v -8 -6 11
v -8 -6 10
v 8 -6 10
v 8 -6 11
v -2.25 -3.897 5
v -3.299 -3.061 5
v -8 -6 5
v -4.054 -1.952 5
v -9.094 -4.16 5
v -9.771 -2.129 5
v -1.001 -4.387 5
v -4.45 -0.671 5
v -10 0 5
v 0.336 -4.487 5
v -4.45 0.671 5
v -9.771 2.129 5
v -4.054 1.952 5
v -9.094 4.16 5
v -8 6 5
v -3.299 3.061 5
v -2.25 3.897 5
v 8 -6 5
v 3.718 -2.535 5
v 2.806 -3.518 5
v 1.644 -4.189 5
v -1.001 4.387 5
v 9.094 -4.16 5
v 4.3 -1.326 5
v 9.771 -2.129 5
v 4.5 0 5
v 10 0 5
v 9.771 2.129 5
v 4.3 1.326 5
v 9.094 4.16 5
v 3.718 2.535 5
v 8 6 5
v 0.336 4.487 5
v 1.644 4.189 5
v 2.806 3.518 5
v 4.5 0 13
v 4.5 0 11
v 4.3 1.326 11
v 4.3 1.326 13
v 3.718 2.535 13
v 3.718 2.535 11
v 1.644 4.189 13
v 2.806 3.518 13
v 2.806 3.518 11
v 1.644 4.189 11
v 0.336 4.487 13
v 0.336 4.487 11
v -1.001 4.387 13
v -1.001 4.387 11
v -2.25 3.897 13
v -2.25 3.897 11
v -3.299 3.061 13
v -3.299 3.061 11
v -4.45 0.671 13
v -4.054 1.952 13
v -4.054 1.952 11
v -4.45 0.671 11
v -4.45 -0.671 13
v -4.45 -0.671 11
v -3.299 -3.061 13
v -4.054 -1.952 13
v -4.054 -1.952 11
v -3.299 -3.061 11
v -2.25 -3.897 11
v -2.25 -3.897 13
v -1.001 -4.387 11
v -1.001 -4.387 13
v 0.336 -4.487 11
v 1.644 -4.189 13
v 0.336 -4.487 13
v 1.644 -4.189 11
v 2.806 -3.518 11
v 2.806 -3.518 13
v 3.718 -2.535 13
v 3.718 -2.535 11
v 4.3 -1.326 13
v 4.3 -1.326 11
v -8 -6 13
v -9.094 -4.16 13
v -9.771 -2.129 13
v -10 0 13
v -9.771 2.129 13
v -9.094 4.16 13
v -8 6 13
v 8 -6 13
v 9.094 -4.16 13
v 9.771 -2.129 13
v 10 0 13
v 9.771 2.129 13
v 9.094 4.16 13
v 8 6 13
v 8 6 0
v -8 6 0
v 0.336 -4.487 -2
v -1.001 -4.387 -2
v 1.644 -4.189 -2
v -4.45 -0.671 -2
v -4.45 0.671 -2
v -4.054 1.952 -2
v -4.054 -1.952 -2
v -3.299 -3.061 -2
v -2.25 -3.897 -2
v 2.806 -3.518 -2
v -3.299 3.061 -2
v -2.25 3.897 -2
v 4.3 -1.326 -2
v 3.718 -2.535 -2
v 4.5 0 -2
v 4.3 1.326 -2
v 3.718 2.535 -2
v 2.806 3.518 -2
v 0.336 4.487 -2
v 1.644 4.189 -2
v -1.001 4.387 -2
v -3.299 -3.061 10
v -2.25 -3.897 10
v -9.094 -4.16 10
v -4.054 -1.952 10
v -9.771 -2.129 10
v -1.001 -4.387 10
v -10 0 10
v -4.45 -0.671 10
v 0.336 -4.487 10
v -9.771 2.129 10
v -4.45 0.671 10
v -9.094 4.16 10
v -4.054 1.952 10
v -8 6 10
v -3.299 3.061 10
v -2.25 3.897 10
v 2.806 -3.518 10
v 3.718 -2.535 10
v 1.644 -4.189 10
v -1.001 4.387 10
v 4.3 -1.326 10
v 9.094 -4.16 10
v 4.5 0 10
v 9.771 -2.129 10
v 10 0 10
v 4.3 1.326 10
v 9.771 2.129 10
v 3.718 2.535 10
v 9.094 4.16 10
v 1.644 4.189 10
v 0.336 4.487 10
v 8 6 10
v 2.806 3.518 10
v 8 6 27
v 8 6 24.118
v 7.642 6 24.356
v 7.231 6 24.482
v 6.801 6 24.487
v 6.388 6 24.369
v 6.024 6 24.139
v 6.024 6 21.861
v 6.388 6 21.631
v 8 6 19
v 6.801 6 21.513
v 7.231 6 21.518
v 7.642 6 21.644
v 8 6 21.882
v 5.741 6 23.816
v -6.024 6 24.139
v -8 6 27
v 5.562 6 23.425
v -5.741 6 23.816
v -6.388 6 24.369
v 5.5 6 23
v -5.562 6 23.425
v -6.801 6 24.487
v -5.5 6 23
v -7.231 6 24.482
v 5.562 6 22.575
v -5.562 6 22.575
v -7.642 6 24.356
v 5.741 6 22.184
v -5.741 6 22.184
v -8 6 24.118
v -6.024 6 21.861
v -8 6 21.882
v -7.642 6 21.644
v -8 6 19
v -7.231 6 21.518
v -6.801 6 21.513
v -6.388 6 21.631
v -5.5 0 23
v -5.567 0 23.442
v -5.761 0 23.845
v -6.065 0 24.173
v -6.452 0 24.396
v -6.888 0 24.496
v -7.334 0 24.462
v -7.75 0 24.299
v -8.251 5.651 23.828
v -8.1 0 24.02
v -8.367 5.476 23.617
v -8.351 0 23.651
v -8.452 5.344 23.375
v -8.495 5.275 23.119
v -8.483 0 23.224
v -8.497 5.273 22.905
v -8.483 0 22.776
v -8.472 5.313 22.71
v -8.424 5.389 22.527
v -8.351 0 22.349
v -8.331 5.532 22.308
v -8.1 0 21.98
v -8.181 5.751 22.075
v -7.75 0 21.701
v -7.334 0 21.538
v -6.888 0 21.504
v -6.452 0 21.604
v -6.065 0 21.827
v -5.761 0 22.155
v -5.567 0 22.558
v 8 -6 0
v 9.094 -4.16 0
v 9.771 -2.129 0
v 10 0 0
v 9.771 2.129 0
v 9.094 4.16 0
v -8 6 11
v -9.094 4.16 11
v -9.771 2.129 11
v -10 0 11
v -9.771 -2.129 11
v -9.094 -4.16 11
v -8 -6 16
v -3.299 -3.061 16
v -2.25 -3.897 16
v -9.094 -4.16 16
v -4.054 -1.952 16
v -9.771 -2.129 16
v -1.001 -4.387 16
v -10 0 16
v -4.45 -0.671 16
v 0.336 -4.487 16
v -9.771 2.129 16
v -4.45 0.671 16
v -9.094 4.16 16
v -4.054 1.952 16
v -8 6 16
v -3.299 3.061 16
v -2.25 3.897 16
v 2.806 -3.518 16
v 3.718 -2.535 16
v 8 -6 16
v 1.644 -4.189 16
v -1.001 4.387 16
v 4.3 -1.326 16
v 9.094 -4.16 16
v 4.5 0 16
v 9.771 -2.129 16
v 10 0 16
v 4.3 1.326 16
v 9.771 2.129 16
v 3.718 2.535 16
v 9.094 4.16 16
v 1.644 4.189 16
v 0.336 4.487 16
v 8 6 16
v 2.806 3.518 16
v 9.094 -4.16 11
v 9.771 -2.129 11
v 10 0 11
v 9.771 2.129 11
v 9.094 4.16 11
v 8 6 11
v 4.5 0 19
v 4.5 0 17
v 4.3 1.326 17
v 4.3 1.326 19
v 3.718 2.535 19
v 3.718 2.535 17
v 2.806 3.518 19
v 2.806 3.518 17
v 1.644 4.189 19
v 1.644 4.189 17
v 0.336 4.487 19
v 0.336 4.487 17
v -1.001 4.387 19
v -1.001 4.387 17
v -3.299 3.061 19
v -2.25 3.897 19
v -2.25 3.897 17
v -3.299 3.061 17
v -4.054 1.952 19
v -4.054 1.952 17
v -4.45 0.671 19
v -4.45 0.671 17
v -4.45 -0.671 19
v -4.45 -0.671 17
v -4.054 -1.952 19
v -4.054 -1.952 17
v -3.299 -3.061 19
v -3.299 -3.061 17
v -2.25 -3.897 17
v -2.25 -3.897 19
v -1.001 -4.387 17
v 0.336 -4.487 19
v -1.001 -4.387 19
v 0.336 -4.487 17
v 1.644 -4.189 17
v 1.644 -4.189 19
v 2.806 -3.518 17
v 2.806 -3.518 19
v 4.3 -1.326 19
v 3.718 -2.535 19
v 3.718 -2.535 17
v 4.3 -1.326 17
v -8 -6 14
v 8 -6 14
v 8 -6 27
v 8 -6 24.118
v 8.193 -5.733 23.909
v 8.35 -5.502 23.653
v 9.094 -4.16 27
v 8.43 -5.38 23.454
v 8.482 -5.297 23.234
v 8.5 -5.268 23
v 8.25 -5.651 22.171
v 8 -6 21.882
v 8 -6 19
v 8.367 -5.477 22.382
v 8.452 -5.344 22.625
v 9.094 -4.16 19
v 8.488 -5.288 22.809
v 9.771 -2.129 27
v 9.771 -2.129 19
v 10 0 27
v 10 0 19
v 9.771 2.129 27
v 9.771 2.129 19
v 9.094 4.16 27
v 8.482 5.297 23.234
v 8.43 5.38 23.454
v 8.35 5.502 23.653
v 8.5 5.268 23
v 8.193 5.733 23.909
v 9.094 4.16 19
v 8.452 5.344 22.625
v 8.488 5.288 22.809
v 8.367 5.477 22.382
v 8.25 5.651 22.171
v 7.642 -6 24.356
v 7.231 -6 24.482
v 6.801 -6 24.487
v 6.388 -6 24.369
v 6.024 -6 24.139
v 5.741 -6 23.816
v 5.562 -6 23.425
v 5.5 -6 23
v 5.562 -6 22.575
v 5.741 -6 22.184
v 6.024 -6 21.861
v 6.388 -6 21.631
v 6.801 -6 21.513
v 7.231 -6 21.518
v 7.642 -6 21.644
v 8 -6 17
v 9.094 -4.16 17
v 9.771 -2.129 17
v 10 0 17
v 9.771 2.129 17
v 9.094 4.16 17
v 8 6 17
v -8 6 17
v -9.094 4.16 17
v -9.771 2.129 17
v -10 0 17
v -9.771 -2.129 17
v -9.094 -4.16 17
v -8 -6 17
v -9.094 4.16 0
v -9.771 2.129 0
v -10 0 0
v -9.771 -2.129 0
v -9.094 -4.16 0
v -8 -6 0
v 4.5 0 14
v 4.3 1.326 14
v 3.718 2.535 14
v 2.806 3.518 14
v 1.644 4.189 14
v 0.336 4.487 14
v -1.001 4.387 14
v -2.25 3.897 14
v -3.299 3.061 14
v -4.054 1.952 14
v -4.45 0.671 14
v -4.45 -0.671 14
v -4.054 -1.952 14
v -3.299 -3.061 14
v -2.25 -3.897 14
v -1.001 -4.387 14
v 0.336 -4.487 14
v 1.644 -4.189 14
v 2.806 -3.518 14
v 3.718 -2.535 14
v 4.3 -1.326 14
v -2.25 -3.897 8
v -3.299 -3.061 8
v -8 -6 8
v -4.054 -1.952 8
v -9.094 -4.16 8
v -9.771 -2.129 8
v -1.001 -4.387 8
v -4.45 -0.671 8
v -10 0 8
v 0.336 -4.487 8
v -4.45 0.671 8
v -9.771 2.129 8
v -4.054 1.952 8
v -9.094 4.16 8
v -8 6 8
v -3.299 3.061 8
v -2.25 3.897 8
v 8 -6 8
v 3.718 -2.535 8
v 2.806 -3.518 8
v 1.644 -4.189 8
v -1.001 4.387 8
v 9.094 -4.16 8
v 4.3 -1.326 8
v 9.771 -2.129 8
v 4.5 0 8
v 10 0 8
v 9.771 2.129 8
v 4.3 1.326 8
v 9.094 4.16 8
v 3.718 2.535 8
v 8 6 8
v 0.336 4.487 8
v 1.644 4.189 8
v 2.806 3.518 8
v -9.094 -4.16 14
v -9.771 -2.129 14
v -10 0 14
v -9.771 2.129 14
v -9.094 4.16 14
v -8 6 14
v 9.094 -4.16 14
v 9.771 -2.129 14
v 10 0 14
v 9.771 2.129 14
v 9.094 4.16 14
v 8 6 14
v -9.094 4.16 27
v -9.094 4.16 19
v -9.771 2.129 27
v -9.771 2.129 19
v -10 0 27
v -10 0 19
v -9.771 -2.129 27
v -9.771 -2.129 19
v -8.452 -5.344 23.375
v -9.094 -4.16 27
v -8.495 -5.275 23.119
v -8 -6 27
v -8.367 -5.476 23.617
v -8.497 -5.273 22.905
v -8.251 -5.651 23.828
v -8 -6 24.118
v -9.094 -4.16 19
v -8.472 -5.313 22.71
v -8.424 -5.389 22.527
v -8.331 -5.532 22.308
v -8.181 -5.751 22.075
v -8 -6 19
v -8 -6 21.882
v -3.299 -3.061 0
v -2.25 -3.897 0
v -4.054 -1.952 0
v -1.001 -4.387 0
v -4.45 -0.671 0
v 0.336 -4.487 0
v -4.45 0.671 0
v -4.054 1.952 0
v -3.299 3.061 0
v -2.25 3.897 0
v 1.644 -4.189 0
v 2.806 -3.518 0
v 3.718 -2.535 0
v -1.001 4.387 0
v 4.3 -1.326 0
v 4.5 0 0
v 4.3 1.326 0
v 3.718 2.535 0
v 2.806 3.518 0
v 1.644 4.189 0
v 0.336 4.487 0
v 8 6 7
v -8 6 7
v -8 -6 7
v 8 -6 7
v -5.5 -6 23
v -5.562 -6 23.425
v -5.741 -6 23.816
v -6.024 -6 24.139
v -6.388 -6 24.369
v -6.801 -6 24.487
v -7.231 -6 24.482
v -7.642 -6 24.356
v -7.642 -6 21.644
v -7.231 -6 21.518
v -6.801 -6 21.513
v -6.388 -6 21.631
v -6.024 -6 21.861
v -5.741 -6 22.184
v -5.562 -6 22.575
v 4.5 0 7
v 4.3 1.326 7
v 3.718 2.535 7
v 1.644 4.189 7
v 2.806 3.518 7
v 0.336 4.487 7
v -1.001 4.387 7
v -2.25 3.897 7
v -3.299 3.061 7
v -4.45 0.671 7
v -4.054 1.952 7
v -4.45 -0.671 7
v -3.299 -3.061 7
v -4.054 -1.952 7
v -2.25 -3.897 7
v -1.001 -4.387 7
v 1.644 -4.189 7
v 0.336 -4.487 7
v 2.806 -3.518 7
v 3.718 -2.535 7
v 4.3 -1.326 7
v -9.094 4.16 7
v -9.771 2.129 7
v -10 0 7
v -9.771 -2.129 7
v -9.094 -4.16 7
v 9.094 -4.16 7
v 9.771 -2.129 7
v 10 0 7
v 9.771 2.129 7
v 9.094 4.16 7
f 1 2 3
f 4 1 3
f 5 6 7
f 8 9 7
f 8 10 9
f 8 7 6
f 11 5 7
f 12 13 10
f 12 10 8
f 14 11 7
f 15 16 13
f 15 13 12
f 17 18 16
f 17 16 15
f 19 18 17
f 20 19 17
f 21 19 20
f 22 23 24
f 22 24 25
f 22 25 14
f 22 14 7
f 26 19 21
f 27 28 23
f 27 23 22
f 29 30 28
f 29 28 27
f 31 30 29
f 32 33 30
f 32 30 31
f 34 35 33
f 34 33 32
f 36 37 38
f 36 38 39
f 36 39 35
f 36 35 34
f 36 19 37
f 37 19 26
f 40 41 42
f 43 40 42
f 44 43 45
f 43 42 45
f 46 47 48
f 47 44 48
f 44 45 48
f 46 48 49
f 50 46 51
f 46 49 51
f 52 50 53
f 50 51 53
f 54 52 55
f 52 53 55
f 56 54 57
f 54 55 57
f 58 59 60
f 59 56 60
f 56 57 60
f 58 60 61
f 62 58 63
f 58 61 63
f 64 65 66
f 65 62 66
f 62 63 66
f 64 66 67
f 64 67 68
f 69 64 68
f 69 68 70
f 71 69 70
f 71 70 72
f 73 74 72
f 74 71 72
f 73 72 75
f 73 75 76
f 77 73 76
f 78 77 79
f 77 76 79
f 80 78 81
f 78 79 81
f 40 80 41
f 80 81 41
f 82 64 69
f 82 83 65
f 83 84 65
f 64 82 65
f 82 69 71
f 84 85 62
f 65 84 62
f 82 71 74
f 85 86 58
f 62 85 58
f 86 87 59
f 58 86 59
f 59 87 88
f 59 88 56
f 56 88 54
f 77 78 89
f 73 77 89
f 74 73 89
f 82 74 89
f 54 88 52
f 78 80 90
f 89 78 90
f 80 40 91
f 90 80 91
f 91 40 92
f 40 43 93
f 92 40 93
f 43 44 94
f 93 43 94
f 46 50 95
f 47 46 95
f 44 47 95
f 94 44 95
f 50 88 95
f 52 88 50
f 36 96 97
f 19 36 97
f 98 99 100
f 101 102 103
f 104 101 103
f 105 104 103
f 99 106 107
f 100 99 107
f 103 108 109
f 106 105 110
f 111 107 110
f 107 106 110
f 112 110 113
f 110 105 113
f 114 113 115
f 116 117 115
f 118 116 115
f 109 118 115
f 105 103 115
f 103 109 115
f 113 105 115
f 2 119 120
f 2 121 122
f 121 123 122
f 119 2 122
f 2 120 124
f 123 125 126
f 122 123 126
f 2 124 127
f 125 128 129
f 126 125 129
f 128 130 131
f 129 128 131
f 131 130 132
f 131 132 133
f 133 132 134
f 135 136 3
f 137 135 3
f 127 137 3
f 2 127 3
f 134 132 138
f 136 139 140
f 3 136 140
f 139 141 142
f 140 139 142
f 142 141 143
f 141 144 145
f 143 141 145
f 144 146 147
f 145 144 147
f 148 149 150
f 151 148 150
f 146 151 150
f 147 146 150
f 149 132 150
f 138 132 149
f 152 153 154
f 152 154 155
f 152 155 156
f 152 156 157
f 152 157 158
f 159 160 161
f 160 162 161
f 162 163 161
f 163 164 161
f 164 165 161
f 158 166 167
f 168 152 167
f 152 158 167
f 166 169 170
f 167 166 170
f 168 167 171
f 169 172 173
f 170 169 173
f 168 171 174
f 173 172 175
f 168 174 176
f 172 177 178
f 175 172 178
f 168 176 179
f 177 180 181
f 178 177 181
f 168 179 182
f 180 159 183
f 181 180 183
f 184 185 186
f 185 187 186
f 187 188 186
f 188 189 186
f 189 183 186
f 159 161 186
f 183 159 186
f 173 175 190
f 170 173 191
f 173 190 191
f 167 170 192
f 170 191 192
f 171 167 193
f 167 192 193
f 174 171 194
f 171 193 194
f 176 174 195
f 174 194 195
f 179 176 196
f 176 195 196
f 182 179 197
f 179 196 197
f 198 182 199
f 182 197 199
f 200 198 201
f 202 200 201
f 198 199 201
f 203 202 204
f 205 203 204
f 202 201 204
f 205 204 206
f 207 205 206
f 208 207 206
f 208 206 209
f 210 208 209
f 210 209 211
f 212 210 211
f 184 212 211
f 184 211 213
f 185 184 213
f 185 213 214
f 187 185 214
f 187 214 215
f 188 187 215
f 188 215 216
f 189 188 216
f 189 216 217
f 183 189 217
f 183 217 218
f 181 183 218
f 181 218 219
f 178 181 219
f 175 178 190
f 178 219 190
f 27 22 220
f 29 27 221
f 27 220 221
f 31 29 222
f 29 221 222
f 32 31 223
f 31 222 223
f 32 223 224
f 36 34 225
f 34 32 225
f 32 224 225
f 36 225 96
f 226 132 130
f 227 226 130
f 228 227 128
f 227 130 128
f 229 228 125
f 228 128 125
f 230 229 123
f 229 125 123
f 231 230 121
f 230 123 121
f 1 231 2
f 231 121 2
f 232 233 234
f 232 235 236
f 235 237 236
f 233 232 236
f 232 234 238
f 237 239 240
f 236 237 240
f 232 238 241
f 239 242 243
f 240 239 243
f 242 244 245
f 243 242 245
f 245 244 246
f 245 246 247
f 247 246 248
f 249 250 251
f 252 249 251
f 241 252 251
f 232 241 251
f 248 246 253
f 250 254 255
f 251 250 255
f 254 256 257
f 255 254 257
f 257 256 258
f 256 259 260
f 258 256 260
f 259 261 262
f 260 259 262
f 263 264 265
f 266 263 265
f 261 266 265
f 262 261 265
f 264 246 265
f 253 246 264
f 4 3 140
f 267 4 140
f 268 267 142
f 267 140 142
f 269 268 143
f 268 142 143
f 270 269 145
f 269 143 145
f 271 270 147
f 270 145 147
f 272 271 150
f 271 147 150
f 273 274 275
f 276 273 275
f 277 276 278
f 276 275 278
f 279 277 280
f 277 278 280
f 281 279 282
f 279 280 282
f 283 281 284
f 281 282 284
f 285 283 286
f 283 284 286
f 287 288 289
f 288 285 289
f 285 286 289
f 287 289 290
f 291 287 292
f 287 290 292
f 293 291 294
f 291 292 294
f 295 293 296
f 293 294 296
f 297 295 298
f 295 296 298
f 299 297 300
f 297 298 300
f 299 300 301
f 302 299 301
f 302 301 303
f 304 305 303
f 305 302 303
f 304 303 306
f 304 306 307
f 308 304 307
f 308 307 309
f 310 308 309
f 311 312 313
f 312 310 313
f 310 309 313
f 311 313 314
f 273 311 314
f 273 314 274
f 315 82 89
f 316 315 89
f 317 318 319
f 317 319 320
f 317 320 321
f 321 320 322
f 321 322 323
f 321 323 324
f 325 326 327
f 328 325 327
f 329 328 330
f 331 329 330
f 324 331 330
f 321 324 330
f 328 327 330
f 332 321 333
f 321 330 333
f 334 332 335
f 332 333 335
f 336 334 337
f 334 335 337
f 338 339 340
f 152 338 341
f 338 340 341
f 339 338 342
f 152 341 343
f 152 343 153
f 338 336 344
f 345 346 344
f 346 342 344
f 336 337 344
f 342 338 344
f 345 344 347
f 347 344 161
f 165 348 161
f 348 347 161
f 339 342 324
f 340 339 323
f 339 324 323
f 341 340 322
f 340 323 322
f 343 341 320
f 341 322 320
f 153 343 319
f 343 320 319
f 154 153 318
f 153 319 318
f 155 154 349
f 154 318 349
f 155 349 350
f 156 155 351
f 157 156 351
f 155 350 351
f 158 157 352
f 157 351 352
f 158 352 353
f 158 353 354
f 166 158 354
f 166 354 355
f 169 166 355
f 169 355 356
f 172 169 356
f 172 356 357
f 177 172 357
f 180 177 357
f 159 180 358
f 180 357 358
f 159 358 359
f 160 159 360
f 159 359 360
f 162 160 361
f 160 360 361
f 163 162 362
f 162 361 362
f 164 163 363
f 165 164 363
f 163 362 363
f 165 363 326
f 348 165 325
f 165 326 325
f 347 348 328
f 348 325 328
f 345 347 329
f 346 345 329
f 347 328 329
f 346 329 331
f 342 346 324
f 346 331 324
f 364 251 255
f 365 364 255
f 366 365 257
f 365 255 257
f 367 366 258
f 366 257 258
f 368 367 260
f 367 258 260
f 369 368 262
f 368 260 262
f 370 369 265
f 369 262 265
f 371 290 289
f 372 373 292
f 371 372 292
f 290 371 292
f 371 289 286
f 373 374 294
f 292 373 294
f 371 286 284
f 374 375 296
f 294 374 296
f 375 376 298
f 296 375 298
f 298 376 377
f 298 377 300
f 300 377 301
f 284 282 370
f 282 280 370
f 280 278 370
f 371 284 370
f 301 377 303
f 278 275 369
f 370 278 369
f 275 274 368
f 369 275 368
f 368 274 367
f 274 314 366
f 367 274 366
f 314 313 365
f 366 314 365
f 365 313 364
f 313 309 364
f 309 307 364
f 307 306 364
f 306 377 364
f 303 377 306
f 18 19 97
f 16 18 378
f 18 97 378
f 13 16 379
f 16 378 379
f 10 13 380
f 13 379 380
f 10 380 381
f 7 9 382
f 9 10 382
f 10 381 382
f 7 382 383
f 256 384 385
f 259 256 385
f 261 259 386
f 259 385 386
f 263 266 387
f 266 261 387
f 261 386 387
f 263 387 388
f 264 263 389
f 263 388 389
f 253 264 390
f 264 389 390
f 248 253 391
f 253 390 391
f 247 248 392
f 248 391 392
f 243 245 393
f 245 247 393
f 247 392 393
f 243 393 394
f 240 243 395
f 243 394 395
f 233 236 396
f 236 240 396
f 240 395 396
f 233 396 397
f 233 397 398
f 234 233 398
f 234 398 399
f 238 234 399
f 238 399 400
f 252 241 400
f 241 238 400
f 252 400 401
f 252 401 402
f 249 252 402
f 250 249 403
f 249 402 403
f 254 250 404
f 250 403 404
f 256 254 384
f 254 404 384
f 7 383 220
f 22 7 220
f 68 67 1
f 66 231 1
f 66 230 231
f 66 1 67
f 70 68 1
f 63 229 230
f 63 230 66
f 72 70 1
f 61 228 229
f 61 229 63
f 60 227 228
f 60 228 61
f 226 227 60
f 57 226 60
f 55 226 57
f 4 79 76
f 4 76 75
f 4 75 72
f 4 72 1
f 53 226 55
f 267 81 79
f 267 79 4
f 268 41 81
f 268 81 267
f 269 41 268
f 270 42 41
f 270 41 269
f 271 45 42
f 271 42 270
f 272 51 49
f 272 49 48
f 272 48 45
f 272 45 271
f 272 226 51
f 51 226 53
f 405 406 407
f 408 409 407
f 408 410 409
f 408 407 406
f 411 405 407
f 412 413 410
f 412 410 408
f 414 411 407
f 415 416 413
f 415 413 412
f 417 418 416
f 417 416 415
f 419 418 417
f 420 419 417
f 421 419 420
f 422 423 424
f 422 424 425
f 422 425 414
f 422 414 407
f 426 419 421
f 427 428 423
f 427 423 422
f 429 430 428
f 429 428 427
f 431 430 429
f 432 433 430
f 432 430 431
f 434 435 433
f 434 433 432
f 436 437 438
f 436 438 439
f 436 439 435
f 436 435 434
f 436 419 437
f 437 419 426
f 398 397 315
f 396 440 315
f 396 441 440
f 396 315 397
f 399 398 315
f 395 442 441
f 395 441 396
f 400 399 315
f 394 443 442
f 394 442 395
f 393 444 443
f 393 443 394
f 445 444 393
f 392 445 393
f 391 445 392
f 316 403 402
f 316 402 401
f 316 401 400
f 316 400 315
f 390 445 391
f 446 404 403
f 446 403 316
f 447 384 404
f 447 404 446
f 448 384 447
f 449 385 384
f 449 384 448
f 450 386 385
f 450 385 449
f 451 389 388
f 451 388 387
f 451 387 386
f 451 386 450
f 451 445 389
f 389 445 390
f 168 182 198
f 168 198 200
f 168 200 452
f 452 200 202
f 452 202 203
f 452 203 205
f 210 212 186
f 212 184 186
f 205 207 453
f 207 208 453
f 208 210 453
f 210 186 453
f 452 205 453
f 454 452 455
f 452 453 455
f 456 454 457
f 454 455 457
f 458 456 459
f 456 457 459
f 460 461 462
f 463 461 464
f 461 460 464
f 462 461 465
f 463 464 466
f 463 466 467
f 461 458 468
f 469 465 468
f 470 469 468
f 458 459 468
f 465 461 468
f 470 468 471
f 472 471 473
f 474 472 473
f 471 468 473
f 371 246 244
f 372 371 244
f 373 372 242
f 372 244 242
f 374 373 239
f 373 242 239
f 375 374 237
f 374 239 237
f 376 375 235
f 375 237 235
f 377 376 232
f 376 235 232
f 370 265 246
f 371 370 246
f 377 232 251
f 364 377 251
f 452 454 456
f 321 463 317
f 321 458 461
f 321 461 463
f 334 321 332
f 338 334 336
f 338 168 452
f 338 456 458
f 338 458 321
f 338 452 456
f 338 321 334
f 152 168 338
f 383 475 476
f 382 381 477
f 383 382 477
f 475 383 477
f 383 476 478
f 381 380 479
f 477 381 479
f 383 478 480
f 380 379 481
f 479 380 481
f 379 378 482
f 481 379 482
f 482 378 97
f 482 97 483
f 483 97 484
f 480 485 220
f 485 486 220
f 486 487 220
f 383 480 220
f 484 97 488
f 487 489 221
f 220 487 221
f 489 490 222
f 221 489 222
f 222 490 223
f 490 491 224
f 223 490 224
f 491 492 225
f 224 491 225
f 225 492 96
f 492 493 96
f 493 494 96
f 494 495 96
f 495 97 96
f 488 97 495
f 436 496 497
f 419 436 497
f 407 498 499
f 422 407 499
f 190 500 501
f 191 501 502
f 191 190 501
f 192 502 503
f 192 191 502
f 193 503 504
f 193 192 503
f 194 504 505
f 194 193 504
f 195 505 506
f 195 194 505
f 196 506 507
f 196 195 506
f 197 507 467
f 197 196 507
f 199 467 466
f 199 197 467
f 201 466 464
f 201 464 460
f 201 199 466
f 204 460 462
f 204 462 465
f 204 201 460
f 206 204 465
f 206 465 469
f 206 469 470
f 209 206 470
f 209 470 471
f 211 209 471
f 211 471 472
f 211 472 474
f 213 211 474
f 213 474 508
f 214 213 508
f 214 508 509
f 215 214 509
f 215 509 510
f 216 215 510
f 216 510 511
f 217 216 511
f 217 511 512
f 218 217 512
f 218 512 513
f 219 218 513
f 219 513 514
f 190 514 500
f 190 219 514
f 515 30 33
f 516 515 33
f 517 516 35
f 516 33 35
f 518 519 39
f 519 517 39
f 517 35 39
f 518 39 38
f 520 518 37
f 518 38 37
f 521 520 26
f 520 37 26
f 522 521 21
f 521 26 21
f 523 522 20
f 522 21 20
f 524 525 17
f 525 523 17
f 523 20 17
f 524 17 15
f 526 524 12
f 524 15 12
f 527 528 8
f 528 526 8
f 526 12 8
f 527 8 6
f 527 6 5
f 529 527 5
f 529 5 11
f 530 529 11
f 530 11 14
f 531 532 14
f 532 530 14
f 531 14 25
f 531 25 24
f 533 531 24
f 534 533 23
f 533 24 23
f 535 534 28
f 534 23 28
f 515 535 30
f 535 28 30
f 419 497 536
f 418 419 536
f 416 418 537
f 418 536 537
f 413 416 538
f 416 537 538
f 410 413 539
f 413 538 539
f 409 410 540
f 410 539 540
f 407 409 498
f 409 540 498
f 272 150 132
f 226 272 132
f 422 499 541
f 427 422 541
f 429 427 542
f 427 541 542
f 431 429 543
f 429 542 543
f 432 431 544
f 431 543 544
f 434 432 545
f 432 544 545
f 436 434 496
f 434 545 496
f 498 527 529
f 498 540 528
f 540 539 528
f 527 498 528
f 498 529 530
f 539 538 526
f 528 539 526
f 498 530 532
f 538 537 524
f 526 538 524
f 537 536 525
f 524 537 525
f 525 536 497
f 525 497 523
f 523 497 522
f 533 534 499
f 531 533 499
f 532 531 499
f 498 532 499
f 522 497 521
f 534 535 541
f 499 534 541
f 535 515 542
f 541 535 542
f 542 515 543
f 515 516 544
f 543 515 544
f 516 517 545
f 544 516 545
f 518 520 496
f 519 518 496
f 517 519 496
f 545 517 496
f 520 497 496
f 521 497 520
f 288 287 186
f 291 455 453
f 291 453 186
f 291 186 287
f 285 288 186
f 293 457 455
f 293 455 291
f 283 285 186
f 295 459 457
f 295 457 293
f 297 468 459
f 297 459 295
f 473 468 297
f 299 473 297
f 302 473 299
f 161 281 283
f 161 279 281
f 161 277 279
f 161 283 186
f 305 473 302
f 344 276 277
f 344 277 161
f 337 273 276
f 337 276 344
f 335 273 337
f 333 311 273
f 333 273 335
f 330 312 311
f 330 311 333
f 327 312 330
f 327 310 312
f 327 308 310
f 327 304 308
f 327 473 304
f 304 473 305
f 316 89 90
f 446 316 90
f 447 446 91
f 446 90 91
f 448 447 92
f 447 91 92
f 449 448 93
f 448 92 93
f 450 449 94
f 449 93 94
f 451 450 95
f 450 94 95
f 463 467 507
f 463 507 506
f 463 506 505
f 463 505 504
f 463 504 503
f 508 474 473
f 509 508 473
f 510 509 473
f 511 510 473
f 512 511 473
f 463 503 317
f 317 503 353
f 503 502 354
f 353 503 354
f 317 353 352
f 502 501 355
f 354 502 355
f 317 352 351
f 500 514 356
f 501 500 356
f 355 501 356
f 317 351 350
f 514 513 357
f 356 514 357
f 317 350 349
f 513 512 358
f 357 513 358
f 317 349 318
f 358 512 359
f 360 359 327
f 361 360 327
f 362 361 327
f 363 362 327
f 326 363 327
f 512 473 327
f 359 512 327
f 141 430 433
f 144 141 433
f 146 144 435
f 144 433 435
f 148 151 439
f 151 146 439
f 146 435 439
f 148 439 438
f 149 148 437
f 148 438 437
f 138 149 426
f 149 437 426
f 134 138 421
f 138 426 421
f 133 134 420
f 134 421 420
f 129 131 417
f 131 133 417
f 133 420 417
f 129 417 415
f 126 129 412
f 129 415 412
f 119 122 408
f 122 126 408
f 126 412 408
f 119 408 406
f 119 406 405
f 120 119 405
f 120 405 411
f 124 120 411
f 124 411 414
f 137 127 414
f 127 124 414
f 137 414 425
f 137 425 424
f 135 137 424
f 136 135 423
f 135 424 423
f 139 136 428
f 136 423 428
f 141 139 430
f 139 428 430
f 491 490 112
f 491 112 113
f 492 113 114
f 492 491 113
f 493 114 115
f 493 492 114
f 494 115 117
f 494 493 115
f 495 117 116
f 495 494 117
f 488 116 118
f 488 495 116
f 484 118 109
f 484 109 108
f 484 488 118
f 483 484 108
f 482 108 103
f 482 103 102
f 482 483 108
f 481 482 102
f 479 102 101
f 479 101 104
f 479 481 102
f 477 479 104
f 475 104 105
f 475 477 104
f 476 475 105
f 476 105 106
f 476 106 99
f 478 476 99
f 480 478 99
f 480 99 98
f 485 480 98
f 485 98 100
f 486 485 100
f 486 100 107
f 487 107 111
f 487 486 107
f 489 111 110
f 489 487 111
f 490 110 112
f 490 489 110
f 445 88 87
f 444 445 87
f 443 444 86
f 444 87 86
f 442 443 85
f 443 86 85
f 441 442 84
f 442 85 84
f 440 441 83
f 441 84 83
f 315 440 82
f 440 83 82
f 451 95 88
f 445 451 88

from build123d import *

# Parameters (mm, degrees)
F1_DEPTH      = 27
F2_W          = 30
F2_H          = 2
F3_DEPTH      = 6
F4_R          = 4.5
F5_DEPTH      = 27
F5_DEPTH_BACK = 2
F6_R          = 1.5
F7_DEPTH      = 6


with BuildPart() as f1:
    # F0 (on Top) → F1 (new body)
    with BuildSketch(Plane.XY):
        with BuildLine():
            Line((-8, -6), (8, -6))
            ThreePointArc((8, -6), (10, 0), (8, 6))
            Line((8, 6), (-8, 6))
            ThreePointArc((-8, 6), (-10, 0), (-8, -6))
        make_face()
    extrude(amount=F1_DEPTH)

    # F2 (on Front) → F3 (cut, symmetric)
    with BuildSketch(Plane.XZ):
        with Locations((0, 6)):
            Rectangle(F2_W, F2_H)
        with Locations((0, 9)):
            Rectangle(F2_W, F2_H)
        with Locations((0, 12)):
            Rectangle(F2_W, F2_H)
        with Locations((0, 15)):
            Rectangle(F2_W, F2_H)
        with Locations((0, 18)):
            Rectangle(F2_W, F2_H)
    extrude(amount=F3_DEPTH, both=True, mode=Mode.SUBTRACT)

    # F4 (on Top) → F5 (join, two sides)
    with BuildSketch(Plane.XY) as f5_sk:
        Circle(F4_R)
    extrude(amount=F5_DEPTH)
    extrude(f5_sk.sketch, amount=-F5_DEPTH_BACK)

    # F6 (on Front) → F7 (cut, symmetric)
    with BuildSketch(Plane.XZ):
        with Locations((-7, 23)):
            Circle(F6_R)
        with Locations((7, 23)):
            Circle(F6_R)
    extrude(amount=F7_DEPTH, both=True, mode=Mode.SUBTRACT)


solid = f1.part
